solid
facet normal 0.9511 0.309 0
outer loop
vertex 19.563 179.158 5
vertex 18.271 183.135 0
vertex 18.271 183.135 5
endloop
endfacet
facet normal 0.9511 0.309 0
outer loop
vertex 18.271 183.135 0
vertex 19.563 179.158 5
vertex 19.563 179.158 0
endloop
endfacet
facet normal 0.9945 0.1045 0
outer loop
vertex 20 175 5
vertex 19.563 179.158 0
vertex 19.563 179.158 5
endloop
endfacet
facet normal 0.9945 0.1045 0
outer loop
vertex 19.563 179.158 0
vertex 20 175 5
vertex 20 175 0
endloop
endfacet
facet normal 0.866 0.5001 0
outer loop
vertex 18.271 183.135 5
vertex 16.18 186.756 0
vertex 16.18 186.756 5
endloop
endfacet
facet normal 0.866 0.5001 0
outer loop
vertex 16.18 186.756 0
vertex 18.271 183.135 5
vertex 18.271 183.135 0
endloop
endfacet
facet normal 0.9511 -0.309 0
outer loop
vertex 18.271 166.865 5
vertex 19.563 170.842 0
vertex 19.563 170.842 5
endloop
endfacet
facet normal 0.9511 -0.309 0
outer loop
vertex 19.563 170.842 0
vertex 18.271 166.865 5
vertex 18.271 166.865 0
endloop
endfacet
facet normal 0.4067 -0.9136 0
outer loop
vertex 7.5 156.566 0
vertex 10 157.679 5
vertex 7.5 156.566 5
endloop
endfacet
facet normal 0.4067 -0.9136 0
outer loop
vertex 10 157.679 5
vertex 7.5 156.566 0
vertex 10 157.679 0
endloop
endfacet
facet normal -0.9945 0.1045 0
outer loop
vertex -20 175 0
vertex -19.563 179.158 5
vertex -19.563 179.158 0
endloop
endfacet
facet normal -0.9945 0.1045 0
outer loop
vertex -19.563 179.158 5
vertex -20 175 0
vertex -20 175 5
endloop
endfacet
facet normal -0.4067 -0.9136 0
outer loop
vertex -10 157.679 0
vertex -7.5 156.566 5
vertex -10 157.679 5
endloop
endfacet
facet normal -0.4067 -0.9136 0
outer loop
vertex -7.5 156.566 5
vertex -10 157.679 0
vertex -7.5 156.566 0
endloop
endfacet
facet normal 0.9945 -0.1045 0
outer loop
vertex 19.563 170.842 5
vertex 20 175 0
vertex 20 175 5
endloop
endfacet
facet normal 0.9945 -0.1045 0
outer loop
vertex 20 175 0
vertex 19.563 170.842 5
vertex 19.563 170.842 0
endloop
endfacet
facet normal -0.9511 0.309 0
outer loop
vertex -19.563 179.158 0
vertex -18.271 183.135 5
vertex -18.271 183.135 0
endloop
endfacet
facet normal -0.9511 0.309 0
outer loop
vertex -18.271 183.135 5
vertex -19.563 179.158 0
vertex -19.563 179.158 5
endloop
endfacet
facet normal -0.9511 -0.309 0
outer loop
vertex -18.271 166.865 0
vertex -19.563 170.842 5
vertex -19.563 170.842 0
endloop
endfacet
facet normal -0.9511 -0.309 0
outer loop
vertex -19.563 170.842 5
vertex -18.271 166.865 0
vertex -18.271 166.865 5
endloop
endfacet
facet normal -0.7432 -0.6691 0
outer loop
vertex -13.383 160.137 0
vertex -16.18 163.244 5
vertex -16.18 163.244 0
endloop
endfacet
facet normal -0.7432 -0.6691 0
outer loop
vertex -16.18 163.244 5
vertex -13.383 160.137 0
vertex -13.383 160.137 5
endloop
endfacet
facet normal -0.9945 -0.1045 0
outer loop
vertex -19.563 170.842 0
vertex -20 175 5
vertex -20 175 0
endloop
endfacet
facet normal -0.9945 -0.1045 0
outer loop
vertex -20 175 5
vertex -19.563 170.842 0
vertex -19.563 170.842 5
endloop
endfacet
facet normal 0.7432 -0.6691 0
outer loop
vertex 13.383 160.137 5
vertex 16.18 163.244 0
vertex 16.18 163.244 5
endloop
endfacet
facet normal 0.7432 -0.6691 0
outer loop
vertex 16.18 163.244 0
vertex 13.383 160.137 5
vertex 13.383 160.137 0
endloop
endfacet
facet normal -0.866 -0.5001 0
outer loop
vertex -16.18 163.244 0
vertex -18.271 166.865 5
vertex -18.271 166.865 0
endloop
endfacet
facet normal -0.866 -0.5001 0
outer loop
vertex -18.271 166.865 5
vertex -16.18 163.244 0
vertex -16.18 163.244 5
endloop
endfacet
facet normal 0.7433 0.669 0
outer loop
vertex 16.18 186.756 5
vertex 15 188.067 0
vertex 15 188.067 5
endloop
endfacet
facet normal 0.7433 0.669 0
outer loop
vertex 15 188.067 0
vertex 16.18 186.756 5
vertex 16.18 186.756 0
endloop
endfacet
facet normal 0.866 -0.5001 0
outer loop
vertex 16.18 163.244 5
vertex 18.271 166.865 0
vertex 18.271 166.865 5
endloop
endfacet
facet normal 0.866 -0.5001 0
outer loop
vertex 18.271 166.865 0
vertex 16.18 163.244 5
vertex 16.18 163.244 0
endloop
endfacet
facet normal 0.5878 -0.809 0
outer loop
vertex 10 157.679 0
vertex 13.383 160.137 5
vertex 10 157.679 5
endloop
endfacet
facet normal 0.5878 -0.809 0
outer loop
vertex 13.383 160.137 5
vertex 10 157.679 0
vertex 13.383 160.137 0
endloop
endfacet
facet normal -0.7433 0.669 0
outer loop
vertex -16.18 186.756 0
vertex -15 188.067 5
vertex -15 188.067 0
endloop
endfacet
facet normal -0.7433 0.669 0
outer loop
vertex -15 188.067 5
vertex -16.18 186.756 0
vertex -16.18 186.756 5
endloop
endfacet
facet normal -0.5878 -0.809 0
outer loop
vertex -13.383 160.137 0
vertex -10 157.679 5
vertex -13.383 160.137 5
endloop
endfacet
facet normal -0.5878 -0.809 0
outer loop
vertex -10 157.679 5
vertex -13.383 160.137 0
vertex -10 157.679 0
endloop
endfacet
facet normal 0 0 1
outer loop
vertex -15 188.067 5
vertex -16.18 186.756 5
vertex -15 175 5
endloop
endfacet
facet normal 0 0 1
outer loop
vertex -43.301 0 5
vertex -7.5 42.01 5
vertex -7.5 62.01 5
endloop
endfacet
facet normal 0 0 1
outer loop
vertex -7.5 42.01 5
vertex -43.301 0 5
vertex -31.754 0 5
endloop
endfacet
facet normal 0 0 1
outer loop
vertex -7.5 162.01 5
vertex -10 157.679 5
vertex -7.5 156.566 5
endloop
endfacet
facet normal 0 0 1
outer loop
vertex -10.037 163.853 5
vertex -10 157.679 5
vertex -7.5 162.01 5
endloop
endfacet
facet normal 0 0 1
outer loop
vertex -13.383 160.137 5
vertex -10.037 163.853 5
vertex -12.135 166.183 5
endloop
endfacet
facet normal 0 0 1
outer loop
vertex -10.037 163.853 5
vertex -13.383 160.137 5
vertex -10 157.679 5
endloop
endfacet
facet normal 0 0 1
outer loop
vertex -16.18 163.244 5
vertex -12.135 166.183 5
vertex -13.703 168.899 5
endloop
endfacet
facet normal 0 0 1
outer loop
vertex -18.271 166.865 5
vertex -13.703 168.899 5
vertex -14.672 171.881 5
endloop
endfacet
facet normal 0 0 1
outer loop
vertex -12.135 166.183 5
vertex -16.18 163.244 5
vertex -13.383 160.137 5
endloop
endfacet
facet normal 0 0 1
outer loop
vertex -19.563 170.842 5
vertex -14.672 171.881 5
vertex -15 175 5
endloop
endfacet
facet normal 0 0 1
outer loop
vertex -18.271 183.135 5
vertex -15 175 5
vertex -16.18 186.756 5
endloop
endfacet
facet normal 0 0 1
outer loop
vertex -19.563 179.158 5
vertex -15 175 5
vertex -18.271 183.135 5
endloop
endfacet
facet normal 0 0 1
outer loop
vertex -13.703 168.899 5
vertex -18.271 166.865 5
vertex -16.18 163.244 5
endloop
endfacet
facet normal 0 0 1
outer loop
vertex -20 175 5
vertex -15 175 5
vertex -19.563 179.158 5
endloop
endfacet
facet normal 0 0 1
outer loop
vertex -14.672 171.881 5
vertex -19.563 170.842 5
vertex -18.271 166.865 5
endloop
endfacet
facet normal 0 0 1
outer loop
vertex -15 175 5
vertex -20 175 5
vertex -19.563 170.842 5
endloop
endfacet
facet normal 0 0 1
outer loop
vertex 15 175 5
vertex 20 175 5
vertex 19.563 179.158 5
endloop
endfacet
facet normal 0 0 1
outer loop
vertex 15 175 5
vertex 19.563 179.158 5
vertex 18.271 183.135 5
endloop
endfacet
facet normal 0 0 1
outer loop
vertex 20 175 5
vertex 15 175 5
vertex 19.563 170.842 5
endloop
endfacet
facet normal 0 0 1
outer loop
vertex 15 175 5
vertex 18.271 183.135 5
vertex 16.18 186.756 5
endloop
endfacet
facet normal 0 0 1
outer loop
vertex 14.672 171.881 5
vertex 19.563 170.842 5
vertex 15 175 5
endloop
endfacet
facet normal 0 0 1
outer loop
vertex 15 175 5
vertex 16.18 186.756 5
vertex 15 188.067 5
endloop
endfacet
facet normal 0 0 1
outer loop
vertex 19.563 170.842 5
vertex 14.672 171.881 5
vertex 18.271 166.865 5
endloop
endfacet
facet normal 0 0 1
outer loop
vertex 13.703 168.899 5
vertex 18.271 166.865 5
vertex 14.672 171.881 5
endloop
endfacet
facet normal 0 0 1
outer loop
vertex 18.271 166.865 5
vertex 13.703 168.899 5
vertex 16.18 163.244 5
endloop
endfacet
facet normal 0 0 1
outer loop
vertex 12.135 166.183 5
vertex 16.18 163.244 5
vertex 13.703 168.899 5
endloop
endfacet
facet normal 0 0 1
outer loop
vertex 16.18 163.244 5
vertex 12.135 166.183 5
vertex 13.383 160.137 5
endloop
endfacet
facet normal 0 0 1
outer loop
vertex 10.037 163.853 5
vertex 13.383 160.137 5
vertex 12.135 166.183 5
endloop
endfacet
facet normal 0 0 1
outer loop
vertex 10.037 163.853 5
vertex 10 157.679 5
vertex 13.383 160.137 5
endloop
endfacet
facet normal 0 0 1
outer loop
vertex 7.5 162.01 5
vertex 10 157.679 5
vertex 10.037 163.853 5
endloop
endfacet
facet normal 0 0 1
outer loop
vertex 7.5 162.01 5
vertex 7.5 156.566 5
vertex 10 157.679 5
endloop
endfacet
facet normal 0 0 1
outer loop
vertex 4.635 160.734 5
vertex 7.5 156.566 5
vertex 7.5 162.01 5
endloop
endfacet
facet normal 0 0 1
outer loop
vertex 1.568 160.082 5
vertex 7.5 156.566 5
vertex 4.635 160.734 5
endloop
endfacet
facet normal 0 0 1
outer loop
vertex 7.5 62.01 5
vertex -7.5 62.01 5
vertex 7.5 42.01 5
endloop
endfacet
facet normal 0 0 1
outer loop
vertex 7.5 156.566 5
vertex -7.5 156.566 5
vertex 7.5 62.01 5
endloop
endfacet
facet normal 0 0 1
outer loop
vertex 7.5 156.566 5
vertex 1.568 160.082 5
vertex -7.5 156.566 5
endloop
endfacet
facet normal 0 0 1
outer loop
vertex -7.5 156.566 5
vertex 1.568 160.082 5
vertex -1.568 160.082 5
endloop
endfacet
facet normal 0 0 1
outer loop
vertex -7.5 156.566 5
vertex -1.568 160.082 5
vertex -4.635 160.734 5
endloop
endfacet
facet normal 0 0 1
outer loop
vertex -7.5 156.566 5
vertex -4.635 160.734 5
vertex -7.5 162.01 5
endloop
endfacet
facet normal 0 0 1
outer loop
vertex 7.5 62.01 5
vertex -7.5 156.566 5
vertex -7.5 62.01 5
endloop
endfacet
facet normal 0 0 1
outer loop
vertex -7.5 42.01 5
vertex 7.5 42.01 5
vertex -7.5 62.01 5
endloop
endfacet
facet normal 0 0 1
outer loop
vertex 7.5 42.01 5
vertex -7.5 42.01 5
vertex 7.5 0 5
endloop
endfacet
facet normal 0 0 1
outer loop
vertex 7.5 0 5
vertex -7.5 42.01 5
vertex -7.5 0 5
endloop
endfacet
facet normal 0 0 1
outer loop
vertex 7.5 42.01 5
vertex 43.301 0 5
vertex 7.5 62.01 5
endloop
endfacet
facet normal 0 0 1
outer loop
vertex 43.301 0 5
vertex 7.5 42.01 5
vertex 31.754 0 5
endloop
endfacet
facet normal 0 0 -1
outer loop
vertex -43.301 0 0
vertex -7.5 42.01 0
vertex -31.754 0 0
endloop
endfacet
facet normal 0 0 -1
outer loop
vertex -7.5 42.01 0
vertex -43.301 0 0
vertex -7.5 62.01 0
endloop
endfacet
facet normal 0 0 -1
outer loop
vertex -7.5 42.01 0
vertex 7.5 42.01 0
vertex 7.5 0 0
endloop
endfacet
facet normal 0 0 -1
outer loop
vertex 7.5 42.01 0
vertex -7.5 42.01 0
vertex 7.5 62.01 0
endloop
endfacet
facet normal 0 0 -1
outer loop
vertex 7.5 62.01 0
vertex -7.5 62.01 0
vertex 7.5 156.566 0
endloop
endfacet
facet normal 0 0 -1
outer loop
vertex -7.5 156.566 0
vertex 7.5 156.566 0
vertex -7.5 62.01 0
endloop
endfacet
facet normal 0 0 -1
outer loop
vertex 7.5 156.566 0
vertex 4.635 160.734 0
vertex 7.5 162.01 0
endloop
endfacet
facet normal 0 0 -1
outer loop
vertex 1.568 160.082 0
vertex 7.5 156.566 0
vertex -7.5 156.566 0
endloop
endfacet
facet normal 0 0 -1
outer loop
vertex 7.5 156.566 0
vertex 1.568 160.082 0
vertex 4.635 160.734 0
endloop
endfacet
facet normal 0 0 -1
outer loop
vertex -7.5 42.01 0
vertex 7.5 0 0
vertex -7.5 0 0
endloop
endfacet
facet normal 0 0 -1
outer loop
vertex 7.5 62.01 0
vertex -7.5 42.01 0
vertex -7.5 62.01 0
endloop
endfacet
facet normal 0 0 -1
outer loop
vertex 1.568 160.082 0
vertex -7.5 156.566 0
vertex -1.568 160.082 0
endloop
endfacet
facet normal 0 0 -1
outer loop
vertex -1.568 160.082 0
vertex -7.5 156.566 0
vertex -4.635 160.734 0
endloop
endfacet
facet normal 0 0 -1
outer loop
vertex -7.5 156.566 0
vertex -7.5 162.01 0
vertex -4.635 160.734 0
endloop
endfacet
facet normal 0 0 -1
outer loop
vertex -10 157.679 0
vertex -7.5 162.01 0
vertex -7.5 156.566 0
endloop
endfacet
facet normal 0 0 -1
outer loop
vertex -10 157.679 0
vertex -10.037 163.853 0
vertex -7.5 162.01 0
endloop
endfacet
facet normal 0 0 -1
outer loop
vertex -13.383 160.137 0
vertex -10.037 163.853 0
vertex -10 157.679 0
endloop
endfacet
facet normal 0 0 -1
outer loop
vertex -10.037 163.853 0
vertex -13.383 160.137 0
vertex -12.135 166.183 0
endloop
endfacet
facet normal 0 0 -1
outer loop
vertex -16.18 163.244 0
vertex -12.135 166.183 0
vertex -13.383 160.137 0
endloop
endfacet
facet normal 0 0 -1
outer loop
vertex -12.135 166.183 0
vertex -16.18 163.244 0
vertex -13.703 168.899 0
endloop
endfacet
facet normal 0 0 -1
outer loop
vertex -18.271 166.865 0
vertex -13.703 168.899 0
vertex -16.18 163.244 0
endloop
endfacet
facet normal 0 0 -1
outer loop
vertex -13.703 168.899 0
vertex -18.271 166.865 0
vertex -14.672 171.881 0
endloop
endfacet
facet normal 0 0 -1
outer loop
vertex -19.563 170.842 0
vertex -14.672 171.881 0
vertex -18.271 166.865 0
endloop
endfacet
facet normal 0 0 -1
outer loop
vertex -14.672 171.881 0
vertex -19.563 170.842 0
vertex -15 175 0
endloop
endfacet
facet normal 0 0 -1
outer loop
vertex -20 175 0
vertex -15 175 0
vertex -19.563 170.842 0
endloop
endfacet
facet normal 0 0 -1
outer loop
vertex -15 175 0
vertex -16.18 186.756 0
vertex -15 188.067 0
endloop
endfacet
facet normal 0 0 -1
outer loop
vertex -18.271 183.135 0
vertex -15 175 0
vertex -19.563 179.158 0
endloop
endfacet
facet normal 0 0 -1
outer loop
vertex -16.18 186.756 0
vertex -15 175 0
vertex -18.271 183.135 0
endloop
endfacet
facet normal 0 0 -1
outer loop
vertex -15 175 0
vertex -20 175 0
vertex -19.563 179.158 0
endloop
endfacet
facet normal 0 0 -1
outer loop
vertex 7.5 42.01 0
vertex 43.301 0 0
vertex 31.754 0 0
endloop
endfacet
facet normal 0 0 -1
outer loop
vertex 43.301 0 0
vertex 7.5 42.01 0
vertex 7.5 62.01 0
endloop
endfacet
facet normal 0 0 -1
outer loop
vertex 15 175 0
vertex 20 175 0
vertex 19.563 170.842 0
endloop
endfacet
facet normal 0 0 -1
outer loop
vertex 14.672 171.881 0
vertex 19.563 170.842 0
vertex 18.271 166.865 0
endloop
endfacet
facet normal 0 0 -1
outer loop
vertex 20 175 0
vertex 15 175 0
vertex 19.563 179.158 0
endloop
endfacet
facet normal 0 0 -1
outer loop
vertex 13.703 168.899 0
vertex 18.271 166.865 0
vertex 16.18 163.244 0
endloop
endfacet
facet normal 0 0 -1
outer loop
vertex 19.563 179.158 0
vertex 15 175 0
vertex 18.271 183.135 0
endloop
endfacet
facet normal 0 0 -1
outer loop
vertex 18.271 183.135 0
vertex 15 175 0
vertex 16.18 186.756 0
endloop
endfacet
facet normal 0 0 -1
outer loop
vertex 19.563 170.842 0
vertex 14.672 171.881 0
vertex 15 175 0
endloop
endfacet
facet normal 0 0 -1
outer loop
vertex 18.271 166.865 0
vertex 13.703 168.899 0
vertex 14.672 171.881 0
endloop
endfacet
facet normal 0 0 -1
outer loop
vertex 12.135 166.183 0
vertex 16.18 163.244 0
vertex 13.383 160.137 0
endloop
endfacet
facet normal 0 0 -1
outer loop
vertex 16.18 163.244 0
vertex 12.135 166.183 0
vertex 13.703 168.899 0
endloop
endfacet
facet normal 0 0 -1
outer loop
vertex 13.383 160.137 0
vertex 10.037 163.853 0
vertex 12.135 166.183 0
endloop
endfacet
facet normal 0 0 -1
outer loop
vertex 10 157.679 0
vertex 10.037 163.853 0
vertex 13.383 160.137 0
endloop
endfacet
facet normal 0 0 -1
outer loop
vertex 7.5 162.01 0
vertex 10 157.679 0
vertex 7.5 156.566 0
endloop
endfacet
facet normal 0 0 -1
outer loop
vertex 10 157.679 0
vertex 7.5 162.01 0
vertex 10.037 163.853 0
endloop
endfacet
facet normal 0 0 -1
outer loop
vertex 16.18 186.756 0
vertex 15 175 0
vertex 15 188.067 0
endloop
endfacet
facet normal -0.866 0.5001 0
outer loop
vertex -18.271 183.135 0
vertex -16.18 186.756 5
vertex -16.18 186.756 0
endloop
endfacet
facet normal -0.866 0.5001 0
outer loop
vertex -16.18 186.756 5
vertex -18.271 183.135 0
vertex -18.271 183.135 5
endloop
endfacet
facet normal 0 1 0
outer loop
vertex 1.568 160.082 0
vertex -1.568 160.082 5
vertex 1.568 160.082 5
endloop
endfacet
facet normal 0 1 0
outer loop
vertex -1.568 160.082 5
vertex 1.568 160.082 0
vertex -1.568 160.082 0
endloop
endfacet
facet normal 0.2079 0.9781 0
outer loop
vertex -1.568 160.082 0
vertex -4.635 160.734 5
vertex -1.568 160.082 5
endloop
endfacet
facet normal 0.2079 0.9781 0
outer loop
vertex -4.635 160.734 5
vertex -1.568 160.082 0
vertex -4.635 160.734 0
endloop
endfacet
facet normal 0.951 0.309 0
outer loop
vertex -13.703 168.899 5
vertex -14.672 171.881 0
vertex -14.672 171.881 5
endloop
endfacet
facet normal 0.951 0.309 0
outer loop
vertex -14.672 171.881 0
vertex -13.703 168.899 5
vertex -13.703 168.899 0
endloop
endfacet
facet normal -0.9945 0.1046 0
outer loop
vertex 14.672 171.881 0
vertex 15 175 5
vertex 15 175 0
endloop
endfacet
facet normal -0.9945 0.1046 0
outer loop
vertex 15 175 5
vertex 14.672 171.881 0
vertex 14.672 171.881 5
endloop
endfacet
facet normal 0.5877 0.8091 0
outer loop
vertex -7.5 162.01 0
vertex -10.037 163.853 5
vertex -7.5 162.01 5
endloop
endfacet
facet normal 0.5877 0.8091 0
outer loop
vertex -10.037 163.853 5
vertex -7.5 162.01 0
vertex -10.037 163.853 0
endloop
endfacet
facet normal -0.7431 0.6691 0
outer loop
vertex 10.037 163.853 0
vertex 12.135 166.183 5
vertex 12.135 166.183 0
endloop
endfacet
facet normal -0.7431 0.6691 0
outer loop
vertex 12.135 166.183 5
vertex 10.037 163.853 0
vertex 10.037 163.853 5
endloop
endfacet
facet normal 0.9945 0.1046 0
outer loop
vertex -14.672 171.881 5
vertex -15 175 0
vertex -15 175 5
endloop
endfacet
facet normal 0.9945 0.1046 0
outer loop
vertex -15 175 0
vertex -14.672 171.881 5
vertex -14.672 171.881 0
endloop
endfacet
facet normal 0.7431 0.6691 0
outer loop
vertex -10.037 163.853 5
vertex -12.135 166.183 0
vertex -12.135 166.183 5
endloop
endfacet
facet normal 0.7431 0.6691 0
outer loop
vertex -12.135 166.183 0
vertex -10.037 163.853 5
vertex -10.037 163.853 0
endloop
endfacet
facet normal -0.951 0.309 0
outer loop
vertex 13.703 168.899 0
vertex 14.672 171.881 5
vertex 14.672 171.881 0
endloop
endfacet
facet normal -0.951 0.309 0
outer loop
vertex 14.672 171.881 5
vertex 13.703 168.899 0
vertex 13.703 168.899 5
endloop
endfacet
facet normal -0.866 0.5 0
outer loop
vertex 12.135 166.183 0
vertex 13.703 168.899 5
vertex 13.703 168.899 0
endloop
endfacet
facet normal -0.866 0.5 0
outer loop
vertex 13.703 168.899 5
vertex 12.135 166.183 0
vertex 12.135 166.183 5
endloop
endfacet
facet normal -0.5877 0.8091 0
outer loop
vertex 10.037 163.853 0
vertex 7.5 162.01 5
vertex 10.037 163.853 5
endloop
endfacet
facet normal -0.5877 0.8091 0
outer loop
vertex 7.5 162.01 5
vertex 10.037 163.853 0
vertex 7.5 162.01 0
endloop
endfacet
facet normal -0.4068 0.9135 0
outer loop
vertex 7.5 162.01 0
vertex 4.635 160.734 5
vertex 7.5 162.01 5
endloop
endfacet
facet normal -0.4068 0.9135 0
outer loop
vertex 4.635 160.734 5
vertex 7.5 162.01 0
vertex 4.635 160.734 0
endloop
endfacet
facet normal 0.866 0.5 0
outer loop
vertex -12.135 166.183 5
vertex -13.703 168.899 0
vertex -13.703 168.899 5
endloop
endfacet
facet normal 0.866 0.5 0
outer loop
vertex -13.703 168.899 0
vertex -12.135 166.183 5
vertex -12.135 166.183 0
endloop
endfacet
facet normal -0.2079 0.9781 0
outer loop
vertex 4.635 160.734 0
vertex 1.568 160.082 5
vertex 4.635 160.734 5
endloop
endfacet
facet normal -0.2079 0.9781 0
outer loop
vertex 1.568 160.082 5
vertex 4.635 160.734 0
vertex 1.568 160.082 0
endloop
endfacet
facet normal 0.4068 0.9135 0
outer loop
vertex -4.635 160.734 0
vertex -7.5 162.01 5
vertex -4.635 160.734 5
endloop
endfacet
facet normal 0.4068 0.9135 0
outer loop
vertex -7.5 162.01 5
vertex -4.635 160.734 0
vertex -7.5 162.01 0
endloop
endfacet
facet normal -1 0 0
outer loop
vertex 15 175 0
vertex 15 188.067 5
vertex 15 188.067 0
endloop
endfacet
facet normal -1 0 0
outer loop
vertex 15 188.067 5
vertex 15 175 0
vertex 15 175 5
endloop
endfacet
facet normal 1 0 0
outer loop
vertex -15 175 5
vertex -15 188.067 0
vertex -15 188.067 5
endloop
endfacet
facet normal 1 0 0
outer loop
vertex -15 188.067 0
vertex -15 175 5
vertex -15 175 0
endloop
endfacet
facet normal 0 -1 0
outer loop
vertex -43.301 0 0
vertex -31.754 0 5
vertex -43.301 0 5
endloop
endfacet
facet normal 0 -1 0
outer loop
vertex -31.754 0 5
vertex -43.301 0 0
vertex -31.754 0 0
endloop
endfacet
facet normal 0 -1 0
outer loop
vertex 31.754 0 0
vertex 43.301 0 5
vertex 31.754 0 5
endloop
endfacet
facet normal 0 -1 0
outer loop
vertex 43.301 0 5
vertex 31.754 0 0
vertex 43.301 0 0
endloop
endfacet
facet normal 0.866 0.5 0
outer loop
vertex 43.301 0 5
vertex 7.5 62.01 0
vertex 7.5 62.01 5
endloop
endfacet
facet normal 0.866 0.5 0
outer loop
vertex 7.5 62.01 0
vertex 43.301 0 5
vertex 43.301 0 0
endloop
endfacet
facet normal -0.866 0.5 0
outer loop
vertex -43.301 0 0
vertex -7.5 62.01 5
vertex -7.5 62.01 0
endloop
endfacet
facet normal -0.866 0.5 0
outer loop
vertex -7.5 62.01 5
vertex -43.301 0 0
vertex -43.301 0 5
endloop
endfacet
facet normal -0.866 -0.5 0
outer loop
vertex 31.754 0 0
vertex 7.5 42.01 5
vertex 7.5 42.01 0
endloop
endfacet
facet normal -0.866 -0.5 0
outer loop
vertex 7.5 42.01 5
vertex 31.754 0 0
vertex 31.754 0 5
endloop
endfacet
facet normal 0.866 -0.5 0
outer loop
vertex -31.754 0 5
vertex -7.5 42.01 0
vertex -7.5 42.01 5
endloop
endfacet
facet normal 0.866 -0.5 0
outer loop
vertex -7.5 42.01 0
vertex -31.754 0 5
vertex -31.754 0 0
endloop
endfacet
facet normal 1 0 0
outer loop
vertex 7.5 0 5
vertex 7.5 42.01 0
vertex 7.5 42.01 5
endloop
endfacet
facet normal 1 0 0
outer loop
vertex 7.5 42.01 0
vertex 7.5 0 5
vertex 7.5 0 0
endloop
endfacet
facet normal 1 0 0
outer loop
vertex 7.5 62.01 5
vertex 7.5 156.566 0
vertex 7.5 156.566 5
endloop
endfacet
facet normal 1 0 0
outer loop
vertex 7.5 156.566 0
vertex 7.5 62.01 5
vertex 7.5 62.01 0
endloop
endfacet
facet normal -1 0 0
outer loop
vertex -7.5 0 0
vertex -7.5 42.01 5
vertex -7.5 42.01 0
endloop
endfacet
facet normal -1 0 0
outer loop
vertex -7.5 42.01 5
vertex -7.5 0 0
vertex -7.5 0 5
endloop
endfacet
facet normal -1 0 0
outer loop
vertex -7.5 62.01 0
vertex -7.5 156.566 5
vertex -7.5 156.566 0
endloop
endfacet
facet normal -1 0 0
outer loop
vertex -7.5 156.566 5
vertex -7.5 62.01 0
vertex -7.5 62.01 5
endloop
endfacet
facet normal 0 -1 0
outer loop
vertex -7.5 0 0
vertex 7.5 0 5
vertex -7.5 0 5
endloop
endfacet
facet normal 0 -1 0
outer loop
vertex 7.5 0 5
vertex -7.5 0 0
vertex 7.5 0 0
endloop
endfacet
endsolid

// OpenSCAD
translate([-7.5,0,0]) {
   cube([15.0,160,5],center=false);
}

difference(){ 
   translate([0,175,0])
      cylinder(h=5,r=20.0);
   translate([0,175,-0.1])
      cylinder(h=7,r=15.0);
   translate([-15,175,-0.1])
      cube([30,25,35]);   
}   

difference() {
    translate([0,25,0]){
        rotate([0,0,90]){
           linear_extrude(height = 5){
               circle(r=50, $fn=3);
           }
        }
    }

    translate([0,15,-5]){
        rotate([0,0,90]){
           linear_extrude(height = 50){
               circle(r=40, $fn=3);
           }
        }
    }
}
